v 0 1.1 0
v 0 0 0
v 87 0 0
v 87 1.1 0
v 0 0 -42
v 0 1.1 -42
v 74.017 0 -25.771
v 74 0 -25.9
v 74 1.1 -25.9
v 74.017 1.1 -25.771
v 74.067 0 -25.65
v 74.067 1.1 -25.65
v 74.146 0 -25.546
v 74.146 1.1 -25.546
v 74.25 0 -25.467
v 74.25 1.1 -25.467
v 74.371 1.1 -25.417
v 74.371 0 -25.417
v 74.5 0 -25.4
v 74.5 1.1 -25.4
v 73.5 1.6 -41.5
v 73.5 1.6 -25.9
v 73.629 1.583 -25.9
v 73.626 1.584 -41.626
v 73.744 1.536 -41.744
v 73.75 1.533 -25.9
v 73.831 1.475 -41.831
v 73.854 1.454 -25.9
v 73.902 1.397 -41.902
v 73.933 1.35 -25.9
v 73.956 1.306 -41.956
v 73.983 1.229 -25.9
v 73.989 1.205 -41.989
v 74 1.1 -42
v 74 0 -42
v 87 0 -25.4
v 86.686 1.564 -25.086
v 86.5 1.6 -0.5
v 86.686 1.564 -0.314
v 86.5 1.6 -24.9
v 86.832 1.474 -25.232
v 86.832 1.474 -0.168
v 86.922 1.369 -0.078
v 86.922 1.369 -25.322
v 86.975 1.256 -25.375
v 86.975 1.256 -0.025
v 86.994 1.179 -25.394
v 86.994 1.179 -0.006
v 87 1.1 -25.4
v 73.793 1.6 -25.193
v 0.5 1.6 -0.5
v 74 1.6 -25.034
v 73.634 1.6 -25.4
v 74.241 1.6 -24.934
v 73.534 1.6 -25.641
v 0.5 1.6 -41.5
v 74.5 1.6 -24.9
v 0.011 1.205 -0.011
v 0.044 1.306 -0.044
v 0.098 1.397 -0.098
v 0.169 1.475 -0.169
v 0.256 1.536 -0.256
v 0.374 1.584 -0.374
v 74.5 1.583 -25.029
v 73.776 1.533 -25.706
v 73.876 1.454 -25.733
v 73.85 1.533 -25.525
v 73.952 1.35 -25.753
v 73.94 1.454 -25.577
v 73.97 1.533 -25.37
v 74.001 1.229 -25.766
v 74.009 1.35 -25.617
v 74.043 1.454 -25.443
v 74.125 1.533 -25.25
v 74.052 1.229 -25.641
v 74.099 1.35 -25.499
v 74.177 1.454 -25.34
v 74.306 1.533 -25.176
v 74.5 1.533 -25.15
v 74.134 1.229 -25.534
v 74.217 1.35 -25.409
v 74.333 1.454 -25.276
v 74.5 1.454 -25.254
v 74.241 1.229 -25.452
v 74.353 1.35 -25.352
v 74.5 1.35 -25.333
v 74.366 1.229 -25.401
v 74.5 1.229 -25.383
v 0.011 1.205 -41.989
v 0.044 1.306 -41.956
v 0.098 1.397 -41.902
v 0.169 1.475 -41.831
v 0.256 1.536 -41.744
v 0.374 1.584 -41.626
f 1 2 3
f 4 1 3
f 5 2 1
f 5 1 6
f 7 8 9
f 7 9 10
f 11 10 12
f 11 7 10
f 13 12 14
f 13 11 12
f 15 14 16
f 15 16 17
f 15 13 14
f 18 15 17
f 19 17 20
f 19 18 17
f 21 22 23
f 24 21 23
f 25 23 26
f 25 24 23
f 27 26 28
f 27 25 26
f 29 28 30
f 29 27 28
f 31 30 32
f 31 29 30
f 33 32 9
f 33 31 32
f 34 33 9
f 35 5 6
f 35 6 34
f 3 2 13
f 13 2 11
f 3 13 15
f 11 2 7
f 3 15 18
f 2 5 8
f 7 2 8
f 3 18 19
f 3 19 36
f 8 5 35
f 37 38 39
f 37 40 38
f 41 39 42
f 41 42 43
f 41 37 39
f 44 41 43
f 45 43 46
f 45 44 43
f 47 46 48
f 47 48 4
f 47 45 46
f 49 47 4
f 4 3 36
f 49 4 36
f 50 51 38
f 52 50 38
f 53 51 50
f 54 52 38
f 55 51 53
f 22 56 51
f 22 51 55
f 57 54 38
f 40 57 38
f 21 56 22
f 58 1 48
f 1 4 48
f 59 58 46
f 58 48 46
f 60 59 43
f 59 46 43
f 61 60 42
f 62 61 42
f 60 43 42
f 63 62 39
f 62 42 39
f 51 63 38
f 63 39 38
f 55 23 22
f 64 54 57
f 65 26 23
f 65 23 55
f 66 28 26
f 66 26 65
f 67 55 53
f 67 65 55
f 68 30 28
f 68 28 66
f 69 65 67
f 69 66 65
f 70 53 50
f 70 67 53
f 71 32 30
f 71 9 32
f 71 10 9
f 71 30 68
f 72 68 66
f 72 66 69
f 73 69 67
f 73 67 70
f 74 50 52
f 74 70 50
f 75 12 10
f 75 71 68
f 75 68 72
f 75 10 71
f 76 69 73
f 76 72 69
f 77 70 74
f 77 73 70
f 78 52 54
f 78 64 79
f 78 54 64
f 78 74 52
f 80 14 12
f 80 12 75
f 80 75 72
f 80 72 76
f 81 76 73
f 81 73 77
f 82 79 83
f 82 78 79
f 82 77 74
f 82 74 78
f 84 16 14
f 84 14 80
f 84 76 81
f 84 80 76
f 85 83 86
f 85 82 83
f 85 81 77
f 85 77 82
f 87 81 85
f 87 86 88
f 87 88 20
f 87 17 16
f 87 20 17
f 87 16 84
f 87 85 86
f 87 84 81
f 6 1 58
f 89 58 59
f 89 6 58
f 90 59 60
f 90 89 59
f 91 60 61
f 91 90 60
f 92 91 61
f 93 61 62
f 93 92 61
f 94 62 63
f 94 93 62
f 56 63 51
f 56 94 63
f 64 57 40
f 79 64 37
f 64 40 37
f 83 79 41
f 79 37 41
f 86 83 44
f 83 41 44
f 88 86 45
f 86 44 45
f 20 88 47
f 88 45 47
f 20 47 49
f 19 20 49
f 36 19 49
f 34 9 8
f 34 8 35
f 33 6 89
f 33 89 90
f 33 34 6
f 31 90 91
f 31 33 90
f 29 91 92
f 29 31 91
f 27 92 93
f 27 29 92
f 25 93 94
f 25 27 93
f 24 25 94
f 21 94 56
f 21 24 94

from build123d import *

# Parameters (mm, degrees)
SKETCH_55_W         = 87
SKETCH_55_H         = 42
EXTRUDE_1_DEPTH     = 1.6
SKETCH_56_W         = 13
SKETCH_56_H         = 16.6
CUT_EXTRUDE_1_DEPTH = 1.6
FILLET_1_R          = 0.5


with BuildPart() as part:
    # Эскиз55 → Бобышка-Вытянуть1 (new body)
    with BuildSketch(Plane(origin=(0, 0, 0), x_dir=(1, 0, 0), z_dir=(0, 1, 0))):
        with Locations((43.5, 21)):
            Rectangle(SKETCH_55_W, SKETCH_55_H)
    extrude(amount=EXTRUDE_1_DEPTH)

    # Эскиз56 → Вырез-Вытянуть1 (cut)
    with BuildSketch(Plane(origin=(0, 1.6, 0), x_dir=(1, 0, 0), z_dir=(0, 1, 0))):
        with Locations((80.5, 33.7)):
            Rectangle(SKETCH_56_W, SKETCH_56_H)
    extrude(amount=-CUT_EXTRUDE_1_DEPTH, mode=Mode.SUBTRACT)

    # Скругление1
    fillet_1_edges = [part.edges().sort_by_distance(p)[0] for p in [
        (87, 1.6, -12.7),
        (37, 1.6, -42),
        (74, 0.8, -25.4),
        (74, 1.6, -33.7),
        (80.5, 1.6, -25.4),
        (0, 1.6, -21),
        (43.5, 1.6, 0),
    ]]
    fillet(fillet_1_edges, radius=FILLET_1_R)


solid = part.part
